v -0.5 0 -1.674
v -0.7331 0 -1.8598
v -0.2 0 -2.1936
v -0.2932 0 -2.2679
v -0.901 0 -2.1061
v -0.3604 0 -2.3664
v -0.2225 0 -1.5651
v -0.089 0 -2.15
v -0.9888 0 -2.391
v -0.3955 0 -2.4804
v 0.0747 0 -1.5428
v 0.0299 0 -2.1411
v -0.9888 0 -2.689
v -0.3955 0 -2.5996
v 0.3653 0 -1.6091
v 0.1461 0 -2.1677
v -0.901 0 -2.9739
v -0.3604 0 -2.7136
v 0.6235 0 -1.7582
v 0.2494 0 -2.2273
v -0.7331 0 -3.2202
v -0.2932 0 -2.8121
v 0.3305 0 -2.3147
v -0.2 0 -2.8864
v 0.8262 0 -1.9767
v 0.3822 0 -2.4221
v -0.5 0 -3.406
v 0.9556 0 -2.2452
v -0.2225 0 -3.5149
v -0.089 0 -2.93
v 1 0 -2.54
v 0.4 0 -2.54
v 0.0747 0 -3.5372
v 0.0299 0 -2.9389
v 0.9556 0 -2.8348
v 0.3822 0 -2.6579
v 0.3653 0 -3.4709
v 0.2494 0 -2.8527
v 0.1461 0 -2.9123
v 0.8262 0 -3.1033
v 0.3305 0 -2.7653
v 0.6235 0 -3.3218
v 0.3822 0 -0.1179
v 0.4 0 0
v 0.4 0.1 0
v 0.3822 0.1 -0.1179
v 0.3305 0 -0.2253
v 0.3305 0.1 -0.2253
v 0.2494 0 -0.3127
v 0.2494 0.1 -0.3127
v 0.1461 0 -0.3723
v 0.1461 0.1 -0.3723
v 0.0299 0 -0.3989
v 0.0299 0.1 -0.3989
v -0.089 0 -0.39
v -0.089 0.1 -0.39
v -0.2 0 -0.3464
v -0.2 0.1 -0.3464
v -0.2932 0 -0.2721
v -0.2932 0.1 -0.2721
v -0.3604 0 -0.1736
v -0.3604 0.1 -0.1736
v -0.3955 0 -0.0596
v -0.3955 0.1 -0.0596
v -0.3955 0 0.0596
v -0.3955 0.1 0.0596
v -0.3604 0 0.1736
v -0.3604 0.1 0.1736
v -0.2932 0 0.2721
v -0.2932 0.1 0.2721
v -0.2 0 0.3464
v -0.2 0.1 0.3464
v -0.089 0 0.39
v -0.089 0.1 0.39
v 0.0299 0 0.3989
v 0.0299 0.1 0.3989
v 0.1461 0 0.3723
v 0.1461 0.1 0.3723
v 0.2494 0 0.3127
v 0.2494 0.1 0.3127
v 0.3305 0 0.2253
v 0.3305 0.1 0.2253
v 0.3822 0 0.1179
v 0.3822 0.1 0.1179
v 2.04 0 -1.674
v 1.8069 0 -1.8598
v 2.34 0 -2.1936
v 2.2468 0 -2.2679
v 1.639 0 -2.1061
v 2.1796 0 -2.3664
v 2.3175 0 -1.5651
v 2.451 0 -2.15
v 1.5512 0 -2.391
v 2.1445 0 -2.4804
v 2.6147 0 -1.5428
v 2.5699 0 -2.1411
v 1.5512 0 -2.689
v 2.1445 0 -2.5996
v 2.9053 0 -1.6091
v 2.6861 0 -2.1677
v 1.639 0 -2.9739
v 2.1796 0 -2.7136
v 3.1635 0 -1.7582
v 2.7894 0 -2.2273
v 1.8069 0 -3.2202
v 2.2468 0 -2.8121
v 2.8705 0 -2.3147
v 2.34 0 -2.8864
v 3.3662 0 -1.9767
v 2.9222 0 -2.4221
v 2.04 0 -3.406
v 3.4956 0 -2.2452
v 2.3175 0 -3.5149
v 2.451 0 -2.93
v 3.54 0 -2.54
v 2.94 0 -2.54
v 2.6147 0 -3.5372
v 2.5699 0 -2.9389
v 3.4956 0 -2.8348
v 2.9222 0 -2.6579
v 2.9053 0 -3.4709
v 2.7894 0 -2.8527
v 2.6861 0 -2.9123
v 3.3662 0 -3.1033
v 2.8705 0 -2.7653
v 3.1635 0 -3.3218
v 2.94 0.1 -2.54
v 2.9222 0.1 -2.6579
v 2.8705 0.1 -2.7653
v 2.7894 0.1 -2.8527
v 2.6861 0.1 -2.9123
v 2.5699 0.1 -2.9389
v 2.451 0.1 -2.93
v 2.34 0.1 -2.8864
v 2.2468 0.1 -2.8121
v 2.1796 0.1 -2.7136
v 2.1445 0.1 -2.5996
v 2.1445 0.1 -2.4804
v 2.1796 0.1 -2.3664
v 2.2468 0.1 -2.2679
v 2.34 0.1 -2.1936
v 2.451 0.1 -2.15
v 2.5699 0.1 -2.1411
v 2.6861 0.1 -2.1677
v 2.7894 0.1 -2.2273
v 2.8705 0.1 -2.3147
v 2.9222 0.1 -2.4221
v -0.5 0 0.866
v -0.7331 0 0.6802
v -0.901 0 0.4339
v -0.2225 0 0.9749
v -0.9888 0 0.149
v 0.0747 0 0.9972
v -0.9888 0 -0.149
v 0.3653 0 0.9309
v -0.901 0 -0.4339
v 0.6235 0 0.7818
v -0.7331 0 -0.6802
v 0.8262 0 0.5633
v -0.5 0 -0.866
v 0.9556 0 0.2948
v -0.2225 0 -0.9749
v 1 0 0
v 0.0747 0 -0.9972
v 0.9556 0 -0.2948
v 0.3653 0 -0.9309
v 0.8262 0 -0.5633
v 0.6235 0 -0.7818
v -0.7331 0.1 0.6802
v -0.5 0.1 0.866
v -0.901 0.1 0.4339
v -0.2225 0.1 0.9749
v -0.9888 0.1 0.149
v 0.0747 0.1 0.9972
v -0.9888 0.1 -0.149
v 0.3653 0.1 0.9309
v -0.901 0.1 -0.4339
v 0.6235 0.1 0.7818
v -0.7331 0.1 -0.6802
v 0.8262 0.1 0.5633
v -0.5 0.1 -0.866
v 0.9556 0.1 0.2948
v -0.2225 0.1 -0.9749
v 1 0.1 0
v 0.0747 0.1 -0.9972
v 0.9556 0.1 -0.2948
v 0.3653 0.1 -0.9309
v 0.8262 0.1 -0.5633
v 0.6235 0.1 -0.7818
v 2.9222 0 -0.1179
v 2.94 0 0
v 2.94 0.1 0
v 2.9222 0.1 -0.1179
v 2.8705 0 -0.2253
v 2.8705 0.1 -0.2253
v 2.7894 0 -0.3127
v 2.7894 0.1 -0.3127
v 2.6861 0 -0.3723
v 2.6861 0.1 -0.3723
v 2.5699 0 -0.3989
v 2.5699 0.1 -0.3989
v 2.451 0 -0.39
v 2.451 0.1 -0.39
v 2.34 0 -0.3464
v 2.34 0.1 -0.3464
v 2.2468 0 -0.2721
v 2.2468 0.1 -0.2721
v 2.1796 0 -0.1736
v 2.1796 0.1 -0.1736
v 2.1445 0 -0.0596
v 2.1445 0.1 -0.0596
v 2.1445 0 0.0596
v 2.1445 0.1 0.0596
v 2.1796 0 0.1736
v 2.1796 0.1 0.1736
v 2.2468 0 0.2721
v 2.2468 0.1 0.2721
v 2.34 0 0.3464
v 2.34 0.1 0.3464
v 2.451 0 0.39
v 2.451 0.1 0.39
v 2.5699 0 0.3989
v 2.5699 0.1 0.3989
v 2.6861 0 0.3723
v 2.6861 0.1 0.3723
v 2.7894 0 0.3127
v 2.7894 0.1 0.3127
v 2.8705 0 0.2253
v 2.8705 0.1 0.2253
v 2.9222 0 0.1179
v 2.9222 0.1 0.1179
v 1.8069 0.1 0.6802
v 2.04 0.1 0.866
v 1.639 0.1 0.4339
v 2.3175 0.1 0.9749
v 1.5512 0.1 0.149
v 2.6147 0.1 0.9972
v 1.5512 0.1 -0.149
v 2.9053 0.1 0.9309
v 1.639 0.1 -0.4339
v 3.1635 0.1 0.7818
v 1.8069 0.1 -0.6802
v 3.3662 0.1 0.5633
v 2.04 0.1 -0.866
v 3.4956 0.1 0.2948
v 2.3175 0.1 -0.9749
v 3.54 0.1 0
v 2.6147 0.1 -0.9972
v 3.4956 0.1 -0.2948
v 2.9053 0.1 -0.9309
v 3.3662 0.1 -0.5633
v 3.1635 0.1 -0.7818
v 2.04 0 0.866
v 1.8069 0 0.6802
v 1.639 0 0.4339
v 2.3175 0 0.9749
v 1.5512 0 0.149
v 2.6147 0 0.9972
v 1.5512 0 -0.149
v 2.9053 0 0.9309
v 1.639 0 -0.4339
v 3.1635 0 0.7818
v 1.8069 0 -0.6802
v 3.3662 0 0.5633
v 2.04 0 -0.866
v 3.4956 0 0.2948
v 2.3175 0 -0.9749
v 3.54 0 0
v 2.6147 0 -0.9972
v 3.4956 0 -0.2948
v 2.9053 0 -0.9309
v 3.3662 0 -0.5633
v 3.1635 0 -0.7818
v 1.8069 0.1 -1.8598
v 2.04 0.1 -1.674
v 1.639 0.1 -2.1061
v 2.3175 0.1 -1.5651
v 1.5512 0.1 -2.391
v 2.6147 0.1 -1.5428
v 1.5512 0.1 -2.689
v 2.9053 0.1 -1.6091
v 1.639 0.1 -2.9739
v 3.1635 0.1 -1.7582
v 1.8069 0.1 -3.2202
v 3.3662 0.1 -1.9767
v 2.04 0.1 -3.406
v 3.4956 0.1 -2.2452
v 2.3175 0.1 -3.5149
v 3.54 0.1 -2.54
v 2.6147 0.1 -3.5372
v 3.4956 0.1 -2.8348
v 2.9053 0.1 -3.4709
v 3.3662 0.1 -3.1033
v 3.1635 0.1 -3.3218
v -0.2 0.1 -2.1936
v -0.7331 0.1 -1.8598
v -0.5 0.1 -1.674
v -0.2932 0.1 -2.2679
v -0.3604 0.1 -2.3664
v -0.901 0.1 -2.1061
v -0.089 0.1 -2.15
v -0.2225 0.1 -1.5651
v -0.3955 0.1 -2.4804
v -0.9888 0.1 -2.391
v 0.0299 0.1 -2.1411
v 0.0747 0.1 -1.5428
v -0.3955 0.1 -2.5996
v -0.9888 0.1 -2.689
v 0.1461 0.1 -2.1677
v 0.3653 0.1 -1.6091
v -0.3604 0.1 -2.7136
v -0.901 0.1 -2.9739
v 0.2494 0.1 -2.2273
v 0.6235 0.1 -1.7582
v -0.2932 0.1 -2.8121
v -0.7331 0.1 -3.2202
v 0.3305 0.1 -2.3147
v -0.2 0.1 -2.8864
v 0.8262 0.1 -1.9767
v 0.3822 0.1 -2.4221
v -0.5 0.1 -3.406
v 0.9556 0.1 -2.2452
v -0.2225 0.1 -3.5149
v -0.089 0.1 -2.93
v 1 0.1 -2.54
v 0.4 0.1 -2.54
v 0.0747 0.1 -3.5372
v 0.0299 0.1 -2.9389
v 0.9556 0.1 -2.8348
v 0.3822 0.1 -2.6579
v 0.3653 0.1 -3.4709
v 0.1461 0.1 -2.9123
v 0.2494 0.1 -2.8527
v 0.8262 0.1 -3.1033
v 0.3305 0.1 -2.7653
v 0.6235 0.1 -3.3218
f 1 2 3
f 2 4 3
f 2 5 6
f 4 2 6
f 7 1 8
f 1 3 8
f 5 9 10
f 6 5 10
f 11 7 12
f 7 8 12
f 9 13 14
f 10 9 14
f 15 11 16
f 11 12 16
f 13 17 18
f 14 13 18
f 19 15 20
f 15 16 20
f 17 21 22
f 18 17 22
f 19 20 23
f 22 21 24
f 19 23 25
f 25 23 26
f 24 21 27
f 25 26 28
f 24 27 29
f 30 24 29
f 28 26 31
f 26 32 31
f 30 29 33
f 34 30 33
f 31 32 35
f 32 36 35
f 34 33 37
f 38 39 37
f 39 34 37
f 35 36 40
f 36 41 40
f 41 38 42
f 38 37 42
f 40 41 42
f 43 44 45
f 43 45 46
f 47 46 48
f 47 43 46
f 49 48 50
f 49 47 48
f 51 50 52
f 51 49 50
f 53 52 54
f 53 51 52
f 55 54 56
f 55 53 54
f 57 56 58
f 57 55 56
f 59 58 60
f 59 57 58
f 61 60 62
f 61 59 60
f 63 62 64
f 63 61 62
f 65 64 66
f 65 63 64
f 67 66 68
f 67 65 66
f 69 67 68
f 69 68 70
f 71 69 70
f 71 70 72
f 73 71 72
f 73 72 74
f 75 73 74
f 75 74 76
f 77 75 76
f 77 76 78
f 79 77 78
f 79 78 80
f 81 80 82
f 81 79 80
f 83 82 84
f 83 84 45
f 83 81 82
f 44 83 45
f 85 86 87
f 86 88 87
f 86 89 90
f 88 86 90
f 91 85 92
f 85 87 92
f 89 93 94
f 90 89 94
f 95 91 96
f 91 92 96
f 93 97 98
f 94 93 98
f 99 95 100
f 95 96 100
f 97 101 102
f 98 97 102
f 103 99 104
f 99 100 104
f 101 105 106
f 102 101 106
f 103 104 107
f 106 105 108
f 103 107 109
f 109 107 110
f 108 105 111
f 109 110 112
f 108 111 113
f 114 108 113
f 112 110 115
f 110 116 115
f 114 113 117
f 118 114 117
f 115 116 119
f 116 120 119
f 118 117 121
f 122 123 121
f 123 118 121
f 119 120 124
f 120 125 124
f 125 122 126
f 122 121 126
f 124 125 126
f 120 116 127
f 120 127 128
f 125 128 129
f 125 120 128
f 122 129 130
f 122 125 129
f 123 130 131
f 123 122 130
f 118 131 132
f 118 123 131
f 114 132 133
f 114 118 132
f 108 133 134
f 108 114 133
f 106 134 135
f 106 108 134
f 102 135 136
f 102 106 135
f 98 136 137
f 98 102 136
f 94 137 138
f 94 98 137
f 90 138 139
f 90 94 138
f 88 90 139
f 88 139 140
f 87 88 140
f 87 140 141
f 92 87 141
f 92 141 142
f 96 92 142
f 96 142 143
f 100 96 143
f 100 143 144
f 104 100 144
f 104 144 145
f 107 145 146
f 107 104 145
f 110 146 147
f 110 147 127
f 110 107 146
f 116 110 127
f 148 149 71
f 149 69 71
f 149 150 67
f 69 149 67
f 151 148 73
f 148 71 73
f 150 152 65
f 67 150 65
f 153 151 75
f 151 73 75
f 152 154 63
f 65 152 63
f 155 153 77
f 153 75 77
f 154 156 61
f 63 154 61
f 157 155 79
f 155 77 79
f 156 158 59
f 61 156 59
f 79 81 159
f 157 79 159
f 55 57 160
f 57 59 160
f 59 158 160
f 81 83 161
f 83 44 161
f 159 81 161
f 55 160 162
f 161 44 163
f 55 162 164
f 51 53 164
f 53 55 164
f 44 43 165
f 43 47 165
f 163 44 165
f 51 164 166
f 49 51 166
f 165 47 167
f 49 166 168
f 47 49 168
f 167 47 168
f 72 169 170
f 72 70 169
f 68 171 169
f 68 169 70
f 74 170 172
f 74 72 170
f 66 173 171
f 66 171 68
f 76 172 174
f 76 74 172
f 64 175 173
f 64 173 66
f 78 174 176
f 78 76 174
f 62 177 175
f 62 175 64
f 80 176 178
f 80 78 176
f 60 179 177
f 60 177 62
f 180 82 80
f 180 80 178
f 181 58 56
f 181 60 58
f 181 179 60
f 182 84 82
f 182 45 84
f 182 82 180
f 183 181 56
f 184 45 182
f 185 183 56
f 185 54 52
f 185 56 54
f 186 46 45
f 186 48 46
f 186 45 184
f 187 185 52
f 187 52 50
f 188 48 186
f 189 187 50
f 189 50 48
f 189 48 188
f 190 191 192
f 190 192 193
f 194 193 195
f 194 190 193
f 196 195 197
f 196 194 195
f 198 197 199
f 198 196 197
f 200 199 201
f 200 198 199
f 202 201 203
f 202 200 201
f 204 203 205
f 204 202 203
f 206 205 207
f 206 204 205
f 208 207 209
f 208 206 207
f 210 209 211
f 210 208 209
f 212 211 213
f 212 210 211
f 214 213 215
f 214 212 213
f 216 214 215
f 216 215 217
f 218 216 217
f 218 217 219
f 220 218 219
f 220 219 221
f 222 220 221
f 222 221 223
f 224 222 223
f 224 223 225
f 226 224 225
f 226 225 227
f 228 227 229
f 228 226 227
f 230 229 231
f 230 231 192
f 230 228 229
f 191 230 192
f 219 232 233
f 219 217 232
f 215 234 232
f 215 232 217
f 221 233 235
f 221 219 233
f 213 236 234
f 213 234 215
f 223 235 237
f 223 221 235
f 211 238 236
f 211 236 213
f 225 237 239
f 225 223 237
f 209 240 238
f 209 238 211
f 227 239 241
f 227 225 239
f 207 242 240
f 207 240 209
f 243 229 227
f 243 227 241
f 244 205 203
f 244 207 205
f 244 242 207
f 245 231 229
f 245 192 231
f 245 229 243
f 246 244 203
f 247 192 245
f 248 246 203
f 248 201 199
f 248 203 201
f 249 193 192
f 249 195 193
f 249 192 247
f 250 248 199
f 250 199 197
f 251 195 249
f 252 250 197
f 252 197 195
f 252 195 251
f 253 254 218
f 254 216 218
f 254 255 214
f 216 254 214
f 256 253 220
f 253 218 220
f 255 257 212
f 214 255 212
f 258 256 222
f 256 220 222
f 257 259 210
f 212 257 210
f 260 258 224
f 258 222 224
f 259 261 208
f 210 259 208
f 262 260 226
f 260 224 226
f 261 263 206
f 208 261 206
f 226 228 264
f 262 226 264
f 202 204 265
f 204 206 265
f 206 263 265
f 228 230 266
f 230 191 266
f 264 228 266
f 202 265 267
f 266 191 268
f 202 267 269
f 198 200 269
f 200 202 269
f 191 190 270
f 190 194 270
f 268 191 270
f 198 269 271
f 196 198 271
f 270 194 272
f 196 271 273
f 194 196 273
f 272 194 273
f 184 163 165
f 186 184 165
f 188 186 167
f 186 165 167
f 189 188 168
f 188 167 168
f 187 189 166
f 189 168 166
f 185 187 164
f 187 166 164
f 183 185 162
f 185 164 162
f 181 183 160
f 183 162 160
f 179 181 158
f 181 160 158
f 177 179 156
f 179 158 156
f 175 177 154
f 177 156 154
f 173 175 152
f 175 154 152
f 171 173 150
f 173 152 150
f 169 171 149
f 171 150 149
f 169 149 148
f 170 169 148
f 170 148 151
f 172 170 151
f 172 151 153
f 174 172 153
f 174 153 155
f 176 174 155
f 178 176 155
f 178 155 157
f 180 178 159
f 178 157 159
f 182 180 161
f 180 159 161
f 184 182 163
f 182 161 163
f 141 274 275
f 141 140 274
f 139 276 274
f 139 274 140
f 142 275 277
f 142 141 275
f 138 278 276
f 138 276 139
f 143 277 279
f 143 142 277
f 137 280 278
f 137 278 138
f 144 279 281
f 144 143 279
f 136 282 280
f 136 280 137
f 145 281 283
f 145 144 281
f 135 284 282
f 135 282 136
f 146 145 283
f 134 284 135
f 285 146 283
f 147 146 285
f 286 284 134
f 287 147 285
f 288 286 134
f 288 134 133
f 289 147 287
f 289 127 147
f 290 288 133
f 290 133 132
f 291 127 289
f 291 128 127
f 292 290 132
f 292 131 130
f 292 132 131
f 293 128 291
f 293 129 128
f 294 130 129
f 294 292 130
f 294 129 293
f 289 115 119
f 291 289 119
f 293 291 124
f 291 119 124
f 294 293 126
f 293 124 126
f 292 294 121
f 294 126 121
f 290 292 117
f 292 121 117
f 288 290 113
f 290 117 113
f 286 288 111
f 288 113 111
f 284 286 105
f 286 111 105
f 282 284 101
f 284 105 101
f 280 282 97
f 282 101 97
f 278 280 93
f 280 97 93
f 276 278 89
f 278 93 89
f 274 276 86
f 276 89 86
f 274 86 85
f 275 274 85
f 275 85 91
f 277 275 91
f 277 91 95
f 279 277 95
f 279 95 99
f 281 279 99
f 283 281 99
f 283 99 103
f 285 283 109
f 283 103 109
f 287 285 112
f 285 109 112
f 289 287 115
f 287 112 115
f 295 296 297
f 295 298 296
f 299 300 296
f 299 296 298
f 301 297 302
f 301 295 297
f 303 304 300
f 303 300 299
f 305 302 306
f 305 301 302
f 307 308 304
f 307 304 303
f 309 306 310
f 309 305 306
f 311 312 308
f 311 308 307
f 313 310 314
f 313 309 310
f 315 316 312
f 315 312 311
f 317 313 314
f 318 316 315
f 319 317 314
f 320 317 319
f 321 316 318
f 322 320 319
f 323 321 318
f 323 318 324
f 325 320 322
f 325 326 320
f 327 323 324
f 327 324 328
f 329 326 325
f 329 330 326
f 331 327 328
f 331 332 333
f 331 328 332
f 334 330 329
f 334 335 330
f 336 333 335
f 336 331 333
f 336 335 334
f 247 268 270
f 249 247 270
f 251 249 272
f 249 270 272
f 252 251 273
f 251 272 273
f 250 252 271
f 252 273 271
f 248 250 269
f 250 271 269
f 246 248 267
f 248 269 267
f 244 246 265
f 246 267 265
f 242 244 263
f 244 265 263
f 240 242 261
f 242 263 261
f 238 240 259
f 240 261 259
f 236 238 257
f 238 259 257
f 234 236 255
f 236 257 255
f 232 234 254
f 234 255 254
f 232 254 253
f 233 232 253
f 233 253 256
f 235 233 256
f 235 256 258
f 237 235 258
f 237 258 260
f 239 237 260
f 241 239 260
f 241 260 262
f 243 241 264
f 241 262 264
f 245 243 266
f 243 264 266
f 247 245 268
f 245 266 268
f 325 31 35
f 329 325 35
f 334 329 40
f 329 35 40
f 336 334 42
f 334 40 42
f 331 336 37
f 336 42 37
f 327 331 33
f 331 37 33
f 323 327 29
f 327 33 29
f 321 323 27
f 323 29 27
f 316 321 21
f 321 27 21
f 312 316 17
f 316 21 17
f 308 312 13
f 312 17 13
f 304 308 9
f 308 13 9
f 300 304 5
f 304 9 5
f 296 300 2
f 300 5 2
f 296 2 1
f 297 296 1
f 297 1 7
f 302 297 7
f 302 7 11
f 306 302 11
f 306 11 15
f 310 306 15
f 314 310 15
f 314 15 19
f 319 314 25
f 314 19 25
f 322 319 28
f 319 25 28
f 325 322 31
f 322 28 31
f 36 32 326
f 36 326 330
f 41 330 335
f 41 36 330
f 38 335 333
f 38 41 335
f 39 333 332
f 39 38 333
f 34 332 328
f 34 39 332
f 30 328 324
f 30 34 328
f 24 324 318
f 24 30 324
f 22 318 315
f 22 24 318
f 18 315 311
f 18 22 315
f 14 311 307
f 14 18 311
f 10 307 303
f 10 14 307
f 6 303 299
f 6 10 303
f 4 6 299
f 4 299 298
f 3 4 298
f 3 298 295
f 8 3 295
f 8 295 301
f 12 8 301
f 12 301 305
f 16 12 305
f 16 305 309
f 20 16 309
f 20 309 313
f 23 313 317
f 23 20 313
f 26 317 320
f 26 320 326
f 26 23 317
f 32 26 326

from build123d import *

# Parameters (mm, degrees)
SKETCH1_R             = 1
SKETCH1_R_2           = 0.4
BOSS_EXTRUDE1_DEPTH   = 0.1
BOSS_EXTRUDE1_2_DEPTH = 0.1
BOSS_EXTRUDE1_3_DEPTH = 0.1
BOSS_EXTRUDE1_4_DEPTH = 0.1


with BuildPart() as part:
    # Sketch1 → Boss-Extrude1 (new body)
    with BuildSketch(Plane(origin=(0, 0, 0), x_dir=(1, 0, 0), z_dir=(0, 1, 0))):
        Circle(SKETCH1_R)
        Circle(SKETCH1_R_2, mode=Mode.SUBTRACT)
    extrude(amount=BOSS_EXTRUDE1_DEPTH)


with BuildPart() as body_2:
    # Sketch1 → Boss-Extrude1 2 (new body)
    with BuildSketch(Plane(origin=(0, 0, 0), x_dir=(1, 0, 0), z_dir=(0, 1, 0))):
        with Locations((0, 2.54)):
            Circle(SKETCH1_R)
        with Locations((0, 2.54)):
            Circle(SKETCH1_R_2, mode=Mode.SUBTRACT)
    extrude(amount=BOSS_EXTRUDE1_2_DEPTH)


with BuildPart() as body_3:
    # Sketch1 → Boss-Extrude1 3 (new body)
    with BuildSketch(Plane(origin=(0, 0, 0), x_dir=(1, 0, 0), z_dir=(0, 1, 0))):
        with Locations((2.54, 2.54)):
            Circle(SKETCH1_R)
        with Locations((2.54, 2.54)):
            Circle(SKETCH1_R_2, mode=Mode.SUBTRACT)
    extrude(amount=BOSS_EXTRUDE1_3_DEPTH)


with BuildPart() as body_4:
    # Sketch1 → Boss-Extrude1 4 (new body)
    with BuildSketch(Plane(origin=(0, 0, 0), x_dir=(1, 0, 0), z_dir=(0, 1, 0))):
        with Locations((2.54, 0)):
            Circle(SKETCH1_R)
        with Locations((2.54, 0)):
            Circle(SKETCH1_R_2, mode=Mode.SUBTRACT)
    extrude(amount=BOSS_EXTRUDE1_4_DEPTH)


solid = Compound([part.part, body_2.part, body_3.part, body_4.part])
